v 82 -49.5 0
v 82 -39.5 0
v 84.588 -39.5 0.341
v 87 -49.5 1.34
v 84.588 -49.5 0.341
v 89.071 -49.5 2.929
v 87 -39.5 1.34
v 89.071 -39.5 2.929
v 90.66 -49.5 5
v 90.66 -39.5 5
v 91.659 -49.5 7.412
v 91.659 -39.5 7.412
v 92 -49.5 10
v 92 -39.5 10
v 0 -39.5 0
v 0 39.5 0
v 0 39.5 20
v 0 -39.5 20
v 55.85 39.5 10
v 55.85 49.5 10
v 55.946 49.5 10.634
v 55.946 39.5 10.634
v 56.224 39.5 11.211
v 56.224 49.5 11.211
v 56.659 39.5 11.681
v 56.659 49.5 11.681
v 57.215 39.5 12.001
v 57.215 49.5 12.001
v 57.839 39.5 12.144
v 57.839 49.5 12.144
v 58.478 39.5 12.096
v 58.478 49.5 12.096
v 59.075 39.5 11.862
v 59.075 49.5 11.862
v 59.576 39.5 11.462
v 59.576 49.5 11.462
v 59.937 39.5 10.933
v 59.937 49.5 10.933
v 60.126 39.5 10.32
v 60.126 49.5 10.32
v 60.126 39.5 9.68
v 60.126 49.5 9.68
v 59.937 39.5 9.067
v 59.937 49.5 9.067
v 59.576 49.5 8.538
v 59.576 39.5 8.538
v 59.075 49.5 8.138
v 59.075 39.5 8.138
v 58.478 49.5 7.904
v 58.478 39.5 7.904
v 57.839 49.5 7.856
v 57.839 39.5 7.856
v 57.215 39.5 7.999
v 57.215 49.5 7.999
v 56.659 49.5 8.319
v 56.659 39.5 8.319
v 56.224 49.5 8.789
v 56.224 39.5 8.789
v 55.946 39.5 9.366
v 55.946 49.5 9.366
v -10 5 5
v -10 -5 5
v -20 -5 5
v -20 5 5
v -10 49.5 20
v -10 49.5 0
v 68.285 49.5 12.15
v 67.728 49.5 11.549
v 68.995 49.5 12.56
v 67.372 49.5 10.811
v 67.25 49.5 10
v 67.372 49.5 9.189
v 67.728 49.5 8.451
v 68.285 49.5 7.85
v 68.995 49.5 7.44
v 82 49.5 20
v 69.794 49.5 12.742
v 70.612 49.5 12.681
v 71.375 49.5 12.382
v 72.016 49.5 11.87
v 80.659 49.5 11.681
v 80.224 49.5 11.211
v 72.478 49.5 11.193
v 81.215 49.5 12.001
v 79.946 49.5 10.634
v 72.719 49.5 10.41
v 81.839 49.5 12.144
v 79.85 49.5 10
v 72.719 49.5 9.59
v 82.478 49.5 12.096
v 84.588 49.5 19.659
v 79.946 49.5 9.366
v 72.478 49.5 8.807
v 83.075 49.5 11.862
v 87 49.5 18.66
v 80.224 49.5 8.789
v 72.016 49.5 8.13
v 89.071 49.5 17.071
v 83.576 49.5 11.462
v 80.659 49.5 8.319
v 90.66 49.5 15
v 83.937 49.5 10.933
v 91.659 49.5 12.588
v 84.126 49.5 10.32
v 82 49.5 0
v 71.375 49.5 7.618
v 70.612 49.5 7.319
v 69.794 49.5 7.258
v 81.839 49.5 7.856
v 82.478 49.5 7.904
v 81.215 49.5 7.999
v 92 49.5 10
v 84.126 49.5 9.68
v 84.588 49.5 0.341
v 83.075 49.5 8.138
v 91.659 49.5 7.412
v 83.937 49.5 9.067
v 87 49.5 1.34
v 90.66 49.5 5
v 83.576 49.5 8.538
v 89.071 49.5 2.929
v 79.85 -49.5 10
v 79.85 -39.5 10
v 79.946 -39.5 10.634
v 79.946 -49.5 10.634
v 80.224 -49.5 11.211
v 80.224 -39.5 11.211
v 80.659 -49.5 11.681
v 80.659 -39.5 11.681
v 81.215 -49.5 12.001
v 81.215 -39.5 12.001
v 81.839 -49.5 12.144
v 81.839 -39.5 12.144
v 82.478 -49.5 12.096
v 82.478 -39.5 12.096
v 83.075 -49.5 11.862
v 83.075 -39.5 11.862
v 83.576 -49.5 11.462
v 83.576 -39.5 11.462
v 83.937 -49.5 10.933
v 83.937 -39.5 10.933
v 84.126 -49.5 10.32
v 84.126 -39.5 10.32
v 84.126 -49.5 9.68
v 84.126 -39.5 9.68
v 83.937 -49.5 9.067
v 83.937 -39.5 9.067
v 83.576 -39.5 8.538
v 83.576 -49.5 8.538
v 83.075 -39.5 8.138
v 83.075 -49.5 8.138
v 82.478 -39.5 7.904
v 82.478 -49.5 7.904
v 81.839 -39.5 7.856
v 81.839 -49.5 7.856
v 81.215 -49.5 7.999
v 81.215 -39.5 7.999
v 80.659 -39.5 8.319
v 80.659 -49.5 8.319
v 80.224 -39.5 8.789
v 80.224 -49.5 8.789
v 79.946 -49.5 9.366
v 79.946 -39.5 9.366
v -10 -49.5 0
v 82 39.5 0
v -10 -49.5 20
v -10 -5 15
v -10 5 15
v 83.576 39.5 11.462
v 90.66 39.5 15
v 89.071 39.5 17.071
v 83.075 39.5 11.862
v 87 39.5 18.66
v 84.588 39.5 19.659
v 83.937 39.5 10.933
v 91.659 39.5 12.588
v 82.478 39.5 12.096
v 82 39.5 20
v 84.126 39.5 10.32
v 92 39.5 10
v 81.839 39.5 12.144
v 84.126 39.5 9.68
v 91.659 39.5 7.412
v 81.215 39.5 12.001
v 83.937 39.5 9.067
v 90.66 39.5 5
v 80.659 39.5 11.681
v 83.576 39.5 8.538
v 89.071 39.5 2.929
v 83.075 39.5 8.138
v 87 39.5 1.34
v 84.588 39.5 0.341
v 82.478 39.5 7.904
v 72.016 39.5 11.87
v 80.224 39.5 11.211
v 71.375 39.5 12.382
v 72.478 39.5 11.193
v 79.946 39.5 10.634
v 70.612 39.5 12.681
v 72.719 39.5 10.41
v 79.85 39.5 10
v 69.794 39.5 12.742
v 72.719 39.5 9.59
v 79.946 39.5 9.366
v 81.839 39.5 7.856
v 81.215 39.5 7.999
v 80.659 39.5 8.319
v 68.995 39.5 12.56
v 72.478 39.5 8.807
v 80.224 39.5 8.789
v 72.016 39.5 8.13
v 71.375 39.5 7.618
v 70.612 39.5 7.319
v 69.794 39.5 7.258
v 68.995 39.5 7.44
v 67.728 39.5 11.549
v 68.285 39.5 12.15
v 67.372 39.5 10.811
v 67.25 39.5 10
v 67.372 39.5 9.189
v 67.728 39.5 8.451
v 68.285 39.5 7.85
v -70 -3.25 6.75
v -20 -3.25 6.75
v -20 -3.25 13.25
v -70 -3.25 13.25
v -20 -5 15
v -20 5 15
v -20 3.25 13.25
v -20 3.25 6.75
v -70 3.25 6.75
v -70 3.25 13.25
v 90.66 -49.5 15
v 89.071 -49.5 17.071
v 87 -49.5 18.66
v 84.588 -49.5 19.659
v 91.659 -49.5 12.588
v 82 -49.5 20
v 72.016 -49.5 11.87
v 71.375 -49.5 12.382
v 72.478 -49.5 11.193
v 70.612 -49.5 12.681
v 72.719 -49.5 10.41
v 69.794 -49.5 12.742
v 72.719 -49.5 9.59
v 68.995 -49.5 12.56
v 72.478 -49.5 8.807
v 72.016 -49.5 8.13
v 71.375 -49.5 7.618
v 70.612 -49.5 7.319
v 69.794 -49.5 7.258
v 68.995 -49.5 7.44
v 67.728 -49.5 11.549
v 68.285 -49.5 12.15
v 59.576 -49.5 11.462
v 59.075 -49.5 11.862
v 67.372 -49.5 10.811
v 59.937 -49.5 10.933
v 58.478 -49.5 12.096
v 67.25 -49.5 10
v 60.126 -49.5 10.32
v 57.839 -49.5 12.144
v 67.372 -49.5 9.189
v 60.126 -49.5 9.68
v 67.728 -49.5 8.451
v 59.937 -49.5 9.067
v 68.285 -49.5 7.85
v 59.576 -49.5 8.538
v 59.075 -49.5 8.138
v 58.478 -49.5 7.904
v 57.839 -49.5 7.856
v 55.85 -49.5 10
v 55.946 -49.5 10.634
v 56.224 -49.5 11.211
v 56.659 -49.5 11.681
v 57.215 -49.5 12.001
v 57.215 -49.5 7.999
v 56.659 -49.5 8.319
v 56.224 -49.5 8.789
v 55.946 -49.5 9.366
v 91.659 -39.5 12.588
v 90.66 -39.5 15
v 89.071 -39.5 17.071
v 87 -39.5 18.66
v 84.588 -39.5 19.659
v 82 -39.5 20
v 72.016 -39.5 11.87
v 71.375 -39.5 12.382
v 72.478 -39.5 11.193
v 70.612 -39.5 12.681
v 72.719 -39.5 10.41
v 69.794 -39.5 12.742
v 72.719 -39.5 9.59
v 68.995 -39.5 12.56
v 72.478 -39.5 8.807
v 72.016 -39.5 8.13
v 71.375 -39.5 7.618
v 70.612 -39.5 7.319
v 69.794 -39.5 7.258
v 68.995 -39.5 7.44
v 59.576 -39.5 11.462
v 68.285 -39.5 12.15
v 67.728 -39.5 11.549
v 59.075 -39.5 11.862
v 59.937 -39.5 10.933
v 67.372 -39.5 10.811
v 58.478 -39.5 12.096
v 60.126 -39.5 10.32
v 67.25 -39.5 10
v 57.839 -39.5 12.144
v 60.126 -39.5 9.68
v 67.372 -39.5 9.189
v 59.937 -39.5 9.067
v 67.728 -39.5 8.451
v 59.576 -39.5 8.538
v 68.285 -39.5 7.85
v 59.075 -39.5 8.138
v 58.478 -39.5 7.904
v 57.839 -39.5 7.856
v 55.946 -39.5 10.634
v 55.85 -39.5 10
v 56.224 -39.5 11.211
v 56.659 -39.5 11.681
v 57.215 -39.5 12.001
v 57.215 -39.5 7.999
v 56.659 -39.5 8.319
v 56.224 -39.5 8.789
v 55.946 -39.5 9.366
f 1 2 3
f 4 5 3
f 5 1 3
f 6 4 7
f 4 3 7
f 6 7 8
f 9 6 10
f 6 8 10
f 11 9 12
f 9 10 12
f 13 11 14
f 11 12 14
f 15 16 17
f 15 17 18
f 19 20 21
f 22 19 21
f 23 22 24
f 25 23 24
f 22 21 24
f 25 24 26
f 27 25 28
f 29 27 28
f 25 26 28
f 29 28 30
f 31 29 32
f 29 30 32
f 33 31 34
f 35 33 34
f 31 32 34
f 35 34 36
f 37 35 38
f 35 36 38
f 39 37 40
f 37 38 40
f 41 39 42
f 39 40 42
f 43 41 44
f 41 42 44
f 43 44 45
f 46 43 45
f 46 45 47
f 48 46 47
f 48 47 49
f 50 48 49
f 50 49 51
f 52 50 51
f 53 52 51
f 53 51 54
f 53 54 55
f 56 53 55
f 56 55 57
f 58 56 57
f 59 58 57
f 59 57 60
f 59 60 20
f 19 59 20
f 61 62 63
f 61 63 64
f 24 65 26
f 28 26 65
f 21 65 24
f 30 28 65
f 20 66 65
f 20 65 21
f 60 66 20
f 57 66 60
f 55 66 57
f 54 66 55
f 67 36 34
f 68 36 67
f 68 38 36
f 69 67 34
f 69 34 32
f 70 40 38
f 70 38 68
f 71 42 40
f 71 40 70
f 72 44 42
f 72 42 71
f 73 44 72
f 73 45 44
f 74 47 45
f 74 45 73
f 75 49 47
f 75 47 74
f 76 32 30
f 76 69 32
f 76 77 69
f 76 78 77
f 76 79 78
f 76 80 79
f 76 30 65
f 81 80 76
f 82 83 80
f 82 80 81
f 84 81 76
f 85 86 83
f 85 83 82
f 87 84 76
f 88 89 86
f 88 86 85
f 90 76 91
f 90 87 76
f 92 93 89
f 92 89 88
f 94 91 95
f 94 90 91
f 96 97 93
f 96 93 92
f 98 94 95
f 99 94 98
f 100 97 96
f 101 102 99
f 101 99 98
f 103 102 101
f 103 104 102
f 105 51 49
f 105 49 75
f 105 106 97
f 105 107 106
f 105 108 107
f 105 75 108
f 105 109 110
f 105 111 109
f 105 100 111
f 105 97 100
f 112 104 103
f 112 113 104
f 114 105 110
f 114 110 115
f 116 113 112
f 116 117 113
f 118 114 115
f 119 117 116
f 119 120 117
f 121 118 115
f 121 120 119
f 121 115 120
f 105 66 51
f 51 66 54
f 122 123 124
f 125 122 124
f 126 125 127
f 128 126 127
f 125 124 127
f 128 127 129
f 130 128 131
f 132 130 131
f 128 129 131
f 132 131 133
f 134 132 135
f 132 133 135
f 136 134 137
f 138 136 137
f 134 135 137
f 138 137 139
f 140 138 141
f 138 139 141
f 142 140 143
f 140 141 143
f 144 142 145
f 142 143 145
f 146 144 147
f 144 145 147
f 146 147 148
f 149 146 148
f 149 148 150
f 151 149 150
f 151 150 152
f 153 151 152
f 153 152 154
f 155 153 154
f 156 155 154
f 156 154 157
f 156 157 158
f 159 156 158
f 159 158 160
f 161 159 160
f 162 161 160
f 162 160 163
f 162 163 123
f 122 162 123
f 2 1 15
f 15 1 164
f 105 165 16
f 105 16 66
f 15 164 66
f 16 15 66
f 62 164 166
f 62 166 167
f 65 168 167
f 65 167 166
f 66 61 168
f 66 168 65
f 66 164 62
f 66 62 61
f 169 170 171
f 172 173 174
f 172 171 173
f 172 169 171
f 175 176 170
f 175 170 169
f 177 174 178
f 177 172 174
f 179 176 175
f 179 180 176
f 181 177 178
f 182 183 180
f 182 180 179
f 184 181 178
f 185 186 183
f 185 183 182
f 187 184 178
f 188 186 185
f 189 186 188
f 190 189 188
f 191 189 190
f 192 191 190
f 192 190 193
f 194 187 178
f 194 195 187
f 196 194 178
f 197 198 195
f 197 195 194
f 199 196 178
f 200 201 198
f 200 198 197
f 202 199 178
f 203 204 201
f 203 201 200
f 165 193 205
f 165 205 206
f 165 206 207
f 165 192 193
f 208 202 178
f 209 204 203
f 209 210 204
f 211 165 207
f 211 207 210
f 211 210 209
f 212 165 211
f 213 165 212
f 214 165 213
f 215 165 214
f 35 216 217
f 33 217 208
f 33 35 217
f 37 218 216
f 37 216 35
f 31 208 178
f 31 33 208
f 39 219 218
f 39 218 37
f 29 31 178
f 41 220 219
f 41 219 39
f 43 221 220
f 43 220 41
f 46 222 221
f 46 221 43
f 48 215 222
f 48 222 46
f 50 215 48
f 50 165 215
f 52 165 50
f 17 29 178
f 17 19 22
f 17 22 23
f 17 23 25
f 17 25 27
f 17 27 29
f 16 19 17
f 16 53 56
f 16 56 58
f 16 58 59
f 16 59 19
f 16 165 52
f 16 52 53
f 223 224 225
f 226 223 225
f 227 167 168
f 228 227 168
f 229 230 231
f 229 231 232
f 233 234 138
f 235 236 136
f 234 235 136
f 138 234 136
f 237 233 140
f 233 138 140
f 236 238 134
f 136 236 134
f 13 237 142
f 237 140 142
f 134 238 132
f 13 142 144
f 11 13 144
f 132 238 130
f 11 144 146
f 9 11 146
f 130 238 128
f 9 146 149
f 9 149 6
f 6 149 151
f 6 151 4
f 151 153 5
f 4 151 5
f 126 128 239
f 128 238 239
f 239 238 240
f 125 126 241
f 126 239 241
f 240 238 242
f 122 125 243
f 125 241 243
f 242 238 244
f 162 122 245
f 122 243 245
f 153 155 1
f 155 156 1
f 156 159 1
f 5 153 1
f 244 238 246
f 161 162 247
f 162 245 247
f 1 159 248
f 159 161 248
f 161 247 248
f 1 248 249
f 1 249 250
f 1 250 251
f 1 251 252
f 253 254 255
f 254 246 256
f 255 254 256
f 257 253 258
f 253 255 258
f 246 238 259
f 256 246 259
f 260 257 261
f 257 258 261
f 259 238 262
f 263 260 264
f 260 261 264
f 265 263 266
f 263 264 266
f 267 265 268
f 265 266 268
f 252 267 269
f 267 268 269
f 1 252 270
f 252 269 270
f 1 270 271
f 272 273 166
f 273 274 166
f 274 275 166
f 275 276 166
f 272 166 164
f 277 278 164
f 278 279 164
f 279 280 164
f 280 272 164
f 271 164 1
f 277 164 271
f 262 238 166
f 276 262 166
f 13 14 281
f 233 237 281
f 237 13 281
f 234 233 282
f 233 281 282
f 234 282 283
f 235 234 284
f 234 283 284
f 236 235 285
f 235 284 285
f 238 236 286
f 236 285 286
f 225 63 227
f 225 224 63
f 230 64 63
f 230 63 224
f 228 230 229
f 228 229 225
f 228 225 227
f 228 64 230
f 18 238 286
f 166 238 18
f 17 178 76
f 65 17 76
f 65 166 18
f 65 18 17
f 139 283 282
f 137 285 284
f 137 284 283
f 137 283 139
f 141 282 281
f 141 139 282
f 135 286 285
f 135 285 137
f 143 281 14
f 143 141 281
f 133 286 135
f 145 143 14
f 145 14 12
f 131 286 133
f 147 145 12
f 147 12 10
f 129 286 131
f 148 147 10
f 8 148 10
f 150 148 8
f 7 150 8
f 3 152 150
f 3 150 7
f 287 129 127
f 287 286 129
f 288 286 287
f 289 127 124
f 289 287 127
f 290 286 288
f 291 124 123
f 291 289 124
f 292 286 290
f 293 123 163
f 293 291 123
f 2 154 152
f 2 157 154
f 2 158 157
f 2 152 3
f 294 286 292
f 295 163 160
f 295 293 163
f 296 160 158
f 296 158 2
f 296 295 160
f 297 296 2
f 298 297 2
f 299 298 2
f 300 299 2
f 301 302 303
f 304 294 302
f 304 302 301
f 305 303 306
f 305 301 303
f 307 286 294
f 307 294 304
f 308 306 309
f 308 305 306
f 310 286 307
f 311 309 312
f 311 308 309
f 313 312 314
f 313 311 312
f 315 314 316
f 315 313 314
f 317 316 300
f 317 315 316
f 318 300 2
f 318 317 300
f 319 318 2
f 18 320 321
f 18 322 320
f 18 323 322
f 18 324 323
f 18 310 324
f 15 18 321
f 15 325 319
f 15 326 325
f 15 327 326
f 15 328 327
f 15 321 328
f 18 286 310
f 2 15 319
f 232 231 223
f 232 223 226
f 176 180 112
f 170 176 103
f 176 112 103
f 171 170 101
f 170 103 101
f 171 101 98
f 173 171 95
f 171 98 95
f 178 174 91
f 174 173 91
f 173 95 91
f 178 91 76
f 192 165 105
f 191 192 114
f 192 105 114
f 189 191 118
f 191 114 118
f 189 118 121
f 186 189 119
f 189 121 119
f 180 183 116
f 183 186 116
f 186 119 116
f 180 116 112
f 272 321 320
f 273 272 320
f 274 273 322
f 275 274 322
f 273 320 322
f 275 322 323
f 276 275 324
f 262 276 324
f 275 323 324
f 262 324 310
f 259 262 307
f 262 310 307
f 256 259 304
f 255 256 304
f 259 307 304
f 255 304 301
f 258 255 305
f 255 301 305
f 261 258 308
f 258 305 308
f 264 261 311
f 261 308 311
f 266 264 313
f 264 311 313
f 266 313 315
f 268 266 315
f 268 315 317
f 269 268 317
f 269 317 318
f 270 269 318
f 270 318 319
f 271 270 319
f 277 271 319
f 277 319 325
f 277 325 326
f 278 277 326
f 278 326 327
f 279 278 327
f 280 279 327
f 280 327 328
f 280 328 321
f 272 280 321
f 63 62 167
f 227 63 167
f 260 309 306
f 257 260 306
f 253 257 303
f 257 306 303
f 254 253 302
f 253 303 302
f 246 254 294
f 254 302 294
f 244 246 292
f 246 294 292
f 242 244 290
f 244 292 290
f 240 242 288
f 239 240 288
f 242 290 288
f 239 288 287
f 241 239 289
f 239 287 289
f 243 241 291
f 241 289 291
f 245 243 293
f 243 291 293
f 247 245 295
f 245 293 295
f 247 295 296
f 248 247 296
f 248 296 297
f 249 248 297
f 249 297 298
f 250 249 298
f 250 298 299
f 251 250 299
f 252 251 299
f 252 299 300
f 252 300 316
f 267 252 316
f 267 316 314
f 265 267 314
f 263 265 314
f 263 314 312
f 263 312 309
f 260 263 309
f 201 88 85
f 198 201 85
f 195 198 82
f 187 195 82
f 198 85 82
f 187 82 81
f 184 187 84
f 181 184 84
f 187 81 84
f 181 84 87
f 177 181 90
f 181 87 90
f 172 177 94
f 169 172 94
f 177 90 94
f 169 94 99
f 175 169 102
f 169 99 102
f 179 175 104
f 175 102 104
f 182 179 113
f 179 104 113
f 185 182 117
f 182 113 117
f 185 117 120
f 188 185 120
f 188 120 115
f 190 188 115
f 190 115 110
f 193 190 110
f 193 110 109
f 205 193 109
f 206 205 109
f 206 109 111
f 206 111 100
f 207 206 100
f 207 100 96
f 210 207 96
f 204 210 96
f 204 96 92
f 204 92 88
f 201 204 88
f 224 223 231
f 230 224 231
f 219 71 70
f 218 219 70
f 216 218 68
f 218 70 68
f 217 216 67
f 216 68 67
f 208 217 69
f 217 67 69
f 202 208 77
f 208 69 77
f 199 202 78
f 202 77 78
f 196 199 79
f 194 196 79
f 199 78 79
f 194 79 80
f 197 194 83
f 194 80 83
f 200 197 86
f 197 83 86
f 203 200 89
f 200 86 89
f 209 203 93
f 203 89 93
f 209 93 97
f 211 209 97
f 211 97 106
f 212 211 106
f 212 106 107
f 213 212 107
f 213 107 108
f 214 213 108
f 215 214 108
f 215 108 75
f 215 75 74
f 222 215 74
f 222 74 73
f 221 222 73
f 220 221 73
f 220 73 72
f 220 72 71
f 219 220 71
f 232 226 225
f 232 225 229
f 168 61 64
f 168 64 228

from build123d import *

# Parameters (mm, degrees)
EXTRUDE_1_DEPTH     = 20
SKETCH_3_W          = 10
SKETCH_3_H          = 10
SKETCH_3_W_2        = 6.5
SKETCH_3_H_2        = 6.5
EXTRUDE_2_DEPTH     = 10
EXTRUDE_START       = 10
SKETCH_3_3_W        = 6.5
SKETCH_3_3_H        = 6.5
EXTRUDE_3_DEPTH     = 50
SKETCH_4_W          = 20
SKETCH_4_H          = 10
EXTRUDE_4_DEPTH     = 12
SKETCH_2_R          = 2.15
SKETCH_2_R_2        = 2.75
CUT_EXTRUDE_1_DEPTH = 137.619910701


with BuildPart() as part:
    # 草图1 → 凸台-拉伸1 (new body)
    with BuildSketch(Plane.XY):
        Polygon((0, 39.5), (0, -39.5), (80, -39.5), (80, -49.5), (-10, -49.5), (-10, 49.5), (80, 49.5), (80, 39.5), align=None)
    extrude(amount=EXTRUDE_1_DEPTH)

    # 草图3 → 凸台-拉伸2 (add)
    # profile 1 of 2: a face of its own
    with BuildSketch(Plane.ZY.offset(10)):
        with Locations((10, 0)):
            Rectangle(SKETCH_3_W, SKETCH_3_H)
        with Locations((10, 0)):
            Rectangle(SKETCH_3_W_2, SKETCH_3_H_2, mode=Mode.SUBTRACT)
    # profile 2 of 2: a face of its own
    with BuildSketch(Plane.ZY.offset(10)):
        with Locations((10, 0)):
            Rectangle(SKETCH_3_W_2, SKETCH_3_H_2)
    extrude(amount=EXTRUDE_2_DEPTH)

    # 草图3<3> → 凸台-拉伸3 (add)
    with BuildSketch(Plane.ZY.offset(10).offset(EXTRUDE_START)):
        with Locations((10, 0)):
            Rectangle(SKETCH_3_3_W, SKETCH_3_3_H)
    extrude(amount=EXTRUDE_3_DEPTH)

    # 草图4 → 凸台-拉伸4 (add)
    with BuildSketch(Plane(origin=(80, 0, 0), x_dir=(0, 0, -1), z_dir=(1, 0, 0))):
        with Locations((-10, -44.5)):
            Rectangle(SKETCH_4_W, SKETCH_4_H)
        with Locations((-10, 44.5)):
            Rectangle(SKETCH_4_W, SKETCH_4_H)
    extrude(amount=EXTRUDE_4_DEPTH)

    # 草图2 → 切除-拉伸1 (cut, through all)
    with BuildSketch(Plane(origin=(0, 49.5, 0), x_dir=(1, 0, 0), z_dir=(0, 1, 0))):
        with Locations(Location((82, -10, 0), (0, 0, 180))):
            Circle(SKETCH_2_R)
        with BuildLine():
            Line((92, -20), (92, -10))
            ThreePointArc((92, -10), (89.071067812, -17.071067812), (82, -20))
            Line((82, -20), (92, -20))
        make_face()
        with BuildLine():
            ThreePointArc((82, 0), (89.071067812, -2.928932188), (92, -10))
            Line((92, -10), (92, 0))
            Line((92, 0), (82, 0))
        make_face()
        with Locations(Location((70, -10, 0), (0, 0, 180))):
            Circle(SKETCH_2_R_2)
        with Locations(Location((58, -10, 0), (0, 0, 180))):
            Circle(SKETCH_2_R)
    extrude(amount=-CUT_EXTRUDE_1_DEPTH, mode=Mode.SUBTRACT)


solid = part.part
